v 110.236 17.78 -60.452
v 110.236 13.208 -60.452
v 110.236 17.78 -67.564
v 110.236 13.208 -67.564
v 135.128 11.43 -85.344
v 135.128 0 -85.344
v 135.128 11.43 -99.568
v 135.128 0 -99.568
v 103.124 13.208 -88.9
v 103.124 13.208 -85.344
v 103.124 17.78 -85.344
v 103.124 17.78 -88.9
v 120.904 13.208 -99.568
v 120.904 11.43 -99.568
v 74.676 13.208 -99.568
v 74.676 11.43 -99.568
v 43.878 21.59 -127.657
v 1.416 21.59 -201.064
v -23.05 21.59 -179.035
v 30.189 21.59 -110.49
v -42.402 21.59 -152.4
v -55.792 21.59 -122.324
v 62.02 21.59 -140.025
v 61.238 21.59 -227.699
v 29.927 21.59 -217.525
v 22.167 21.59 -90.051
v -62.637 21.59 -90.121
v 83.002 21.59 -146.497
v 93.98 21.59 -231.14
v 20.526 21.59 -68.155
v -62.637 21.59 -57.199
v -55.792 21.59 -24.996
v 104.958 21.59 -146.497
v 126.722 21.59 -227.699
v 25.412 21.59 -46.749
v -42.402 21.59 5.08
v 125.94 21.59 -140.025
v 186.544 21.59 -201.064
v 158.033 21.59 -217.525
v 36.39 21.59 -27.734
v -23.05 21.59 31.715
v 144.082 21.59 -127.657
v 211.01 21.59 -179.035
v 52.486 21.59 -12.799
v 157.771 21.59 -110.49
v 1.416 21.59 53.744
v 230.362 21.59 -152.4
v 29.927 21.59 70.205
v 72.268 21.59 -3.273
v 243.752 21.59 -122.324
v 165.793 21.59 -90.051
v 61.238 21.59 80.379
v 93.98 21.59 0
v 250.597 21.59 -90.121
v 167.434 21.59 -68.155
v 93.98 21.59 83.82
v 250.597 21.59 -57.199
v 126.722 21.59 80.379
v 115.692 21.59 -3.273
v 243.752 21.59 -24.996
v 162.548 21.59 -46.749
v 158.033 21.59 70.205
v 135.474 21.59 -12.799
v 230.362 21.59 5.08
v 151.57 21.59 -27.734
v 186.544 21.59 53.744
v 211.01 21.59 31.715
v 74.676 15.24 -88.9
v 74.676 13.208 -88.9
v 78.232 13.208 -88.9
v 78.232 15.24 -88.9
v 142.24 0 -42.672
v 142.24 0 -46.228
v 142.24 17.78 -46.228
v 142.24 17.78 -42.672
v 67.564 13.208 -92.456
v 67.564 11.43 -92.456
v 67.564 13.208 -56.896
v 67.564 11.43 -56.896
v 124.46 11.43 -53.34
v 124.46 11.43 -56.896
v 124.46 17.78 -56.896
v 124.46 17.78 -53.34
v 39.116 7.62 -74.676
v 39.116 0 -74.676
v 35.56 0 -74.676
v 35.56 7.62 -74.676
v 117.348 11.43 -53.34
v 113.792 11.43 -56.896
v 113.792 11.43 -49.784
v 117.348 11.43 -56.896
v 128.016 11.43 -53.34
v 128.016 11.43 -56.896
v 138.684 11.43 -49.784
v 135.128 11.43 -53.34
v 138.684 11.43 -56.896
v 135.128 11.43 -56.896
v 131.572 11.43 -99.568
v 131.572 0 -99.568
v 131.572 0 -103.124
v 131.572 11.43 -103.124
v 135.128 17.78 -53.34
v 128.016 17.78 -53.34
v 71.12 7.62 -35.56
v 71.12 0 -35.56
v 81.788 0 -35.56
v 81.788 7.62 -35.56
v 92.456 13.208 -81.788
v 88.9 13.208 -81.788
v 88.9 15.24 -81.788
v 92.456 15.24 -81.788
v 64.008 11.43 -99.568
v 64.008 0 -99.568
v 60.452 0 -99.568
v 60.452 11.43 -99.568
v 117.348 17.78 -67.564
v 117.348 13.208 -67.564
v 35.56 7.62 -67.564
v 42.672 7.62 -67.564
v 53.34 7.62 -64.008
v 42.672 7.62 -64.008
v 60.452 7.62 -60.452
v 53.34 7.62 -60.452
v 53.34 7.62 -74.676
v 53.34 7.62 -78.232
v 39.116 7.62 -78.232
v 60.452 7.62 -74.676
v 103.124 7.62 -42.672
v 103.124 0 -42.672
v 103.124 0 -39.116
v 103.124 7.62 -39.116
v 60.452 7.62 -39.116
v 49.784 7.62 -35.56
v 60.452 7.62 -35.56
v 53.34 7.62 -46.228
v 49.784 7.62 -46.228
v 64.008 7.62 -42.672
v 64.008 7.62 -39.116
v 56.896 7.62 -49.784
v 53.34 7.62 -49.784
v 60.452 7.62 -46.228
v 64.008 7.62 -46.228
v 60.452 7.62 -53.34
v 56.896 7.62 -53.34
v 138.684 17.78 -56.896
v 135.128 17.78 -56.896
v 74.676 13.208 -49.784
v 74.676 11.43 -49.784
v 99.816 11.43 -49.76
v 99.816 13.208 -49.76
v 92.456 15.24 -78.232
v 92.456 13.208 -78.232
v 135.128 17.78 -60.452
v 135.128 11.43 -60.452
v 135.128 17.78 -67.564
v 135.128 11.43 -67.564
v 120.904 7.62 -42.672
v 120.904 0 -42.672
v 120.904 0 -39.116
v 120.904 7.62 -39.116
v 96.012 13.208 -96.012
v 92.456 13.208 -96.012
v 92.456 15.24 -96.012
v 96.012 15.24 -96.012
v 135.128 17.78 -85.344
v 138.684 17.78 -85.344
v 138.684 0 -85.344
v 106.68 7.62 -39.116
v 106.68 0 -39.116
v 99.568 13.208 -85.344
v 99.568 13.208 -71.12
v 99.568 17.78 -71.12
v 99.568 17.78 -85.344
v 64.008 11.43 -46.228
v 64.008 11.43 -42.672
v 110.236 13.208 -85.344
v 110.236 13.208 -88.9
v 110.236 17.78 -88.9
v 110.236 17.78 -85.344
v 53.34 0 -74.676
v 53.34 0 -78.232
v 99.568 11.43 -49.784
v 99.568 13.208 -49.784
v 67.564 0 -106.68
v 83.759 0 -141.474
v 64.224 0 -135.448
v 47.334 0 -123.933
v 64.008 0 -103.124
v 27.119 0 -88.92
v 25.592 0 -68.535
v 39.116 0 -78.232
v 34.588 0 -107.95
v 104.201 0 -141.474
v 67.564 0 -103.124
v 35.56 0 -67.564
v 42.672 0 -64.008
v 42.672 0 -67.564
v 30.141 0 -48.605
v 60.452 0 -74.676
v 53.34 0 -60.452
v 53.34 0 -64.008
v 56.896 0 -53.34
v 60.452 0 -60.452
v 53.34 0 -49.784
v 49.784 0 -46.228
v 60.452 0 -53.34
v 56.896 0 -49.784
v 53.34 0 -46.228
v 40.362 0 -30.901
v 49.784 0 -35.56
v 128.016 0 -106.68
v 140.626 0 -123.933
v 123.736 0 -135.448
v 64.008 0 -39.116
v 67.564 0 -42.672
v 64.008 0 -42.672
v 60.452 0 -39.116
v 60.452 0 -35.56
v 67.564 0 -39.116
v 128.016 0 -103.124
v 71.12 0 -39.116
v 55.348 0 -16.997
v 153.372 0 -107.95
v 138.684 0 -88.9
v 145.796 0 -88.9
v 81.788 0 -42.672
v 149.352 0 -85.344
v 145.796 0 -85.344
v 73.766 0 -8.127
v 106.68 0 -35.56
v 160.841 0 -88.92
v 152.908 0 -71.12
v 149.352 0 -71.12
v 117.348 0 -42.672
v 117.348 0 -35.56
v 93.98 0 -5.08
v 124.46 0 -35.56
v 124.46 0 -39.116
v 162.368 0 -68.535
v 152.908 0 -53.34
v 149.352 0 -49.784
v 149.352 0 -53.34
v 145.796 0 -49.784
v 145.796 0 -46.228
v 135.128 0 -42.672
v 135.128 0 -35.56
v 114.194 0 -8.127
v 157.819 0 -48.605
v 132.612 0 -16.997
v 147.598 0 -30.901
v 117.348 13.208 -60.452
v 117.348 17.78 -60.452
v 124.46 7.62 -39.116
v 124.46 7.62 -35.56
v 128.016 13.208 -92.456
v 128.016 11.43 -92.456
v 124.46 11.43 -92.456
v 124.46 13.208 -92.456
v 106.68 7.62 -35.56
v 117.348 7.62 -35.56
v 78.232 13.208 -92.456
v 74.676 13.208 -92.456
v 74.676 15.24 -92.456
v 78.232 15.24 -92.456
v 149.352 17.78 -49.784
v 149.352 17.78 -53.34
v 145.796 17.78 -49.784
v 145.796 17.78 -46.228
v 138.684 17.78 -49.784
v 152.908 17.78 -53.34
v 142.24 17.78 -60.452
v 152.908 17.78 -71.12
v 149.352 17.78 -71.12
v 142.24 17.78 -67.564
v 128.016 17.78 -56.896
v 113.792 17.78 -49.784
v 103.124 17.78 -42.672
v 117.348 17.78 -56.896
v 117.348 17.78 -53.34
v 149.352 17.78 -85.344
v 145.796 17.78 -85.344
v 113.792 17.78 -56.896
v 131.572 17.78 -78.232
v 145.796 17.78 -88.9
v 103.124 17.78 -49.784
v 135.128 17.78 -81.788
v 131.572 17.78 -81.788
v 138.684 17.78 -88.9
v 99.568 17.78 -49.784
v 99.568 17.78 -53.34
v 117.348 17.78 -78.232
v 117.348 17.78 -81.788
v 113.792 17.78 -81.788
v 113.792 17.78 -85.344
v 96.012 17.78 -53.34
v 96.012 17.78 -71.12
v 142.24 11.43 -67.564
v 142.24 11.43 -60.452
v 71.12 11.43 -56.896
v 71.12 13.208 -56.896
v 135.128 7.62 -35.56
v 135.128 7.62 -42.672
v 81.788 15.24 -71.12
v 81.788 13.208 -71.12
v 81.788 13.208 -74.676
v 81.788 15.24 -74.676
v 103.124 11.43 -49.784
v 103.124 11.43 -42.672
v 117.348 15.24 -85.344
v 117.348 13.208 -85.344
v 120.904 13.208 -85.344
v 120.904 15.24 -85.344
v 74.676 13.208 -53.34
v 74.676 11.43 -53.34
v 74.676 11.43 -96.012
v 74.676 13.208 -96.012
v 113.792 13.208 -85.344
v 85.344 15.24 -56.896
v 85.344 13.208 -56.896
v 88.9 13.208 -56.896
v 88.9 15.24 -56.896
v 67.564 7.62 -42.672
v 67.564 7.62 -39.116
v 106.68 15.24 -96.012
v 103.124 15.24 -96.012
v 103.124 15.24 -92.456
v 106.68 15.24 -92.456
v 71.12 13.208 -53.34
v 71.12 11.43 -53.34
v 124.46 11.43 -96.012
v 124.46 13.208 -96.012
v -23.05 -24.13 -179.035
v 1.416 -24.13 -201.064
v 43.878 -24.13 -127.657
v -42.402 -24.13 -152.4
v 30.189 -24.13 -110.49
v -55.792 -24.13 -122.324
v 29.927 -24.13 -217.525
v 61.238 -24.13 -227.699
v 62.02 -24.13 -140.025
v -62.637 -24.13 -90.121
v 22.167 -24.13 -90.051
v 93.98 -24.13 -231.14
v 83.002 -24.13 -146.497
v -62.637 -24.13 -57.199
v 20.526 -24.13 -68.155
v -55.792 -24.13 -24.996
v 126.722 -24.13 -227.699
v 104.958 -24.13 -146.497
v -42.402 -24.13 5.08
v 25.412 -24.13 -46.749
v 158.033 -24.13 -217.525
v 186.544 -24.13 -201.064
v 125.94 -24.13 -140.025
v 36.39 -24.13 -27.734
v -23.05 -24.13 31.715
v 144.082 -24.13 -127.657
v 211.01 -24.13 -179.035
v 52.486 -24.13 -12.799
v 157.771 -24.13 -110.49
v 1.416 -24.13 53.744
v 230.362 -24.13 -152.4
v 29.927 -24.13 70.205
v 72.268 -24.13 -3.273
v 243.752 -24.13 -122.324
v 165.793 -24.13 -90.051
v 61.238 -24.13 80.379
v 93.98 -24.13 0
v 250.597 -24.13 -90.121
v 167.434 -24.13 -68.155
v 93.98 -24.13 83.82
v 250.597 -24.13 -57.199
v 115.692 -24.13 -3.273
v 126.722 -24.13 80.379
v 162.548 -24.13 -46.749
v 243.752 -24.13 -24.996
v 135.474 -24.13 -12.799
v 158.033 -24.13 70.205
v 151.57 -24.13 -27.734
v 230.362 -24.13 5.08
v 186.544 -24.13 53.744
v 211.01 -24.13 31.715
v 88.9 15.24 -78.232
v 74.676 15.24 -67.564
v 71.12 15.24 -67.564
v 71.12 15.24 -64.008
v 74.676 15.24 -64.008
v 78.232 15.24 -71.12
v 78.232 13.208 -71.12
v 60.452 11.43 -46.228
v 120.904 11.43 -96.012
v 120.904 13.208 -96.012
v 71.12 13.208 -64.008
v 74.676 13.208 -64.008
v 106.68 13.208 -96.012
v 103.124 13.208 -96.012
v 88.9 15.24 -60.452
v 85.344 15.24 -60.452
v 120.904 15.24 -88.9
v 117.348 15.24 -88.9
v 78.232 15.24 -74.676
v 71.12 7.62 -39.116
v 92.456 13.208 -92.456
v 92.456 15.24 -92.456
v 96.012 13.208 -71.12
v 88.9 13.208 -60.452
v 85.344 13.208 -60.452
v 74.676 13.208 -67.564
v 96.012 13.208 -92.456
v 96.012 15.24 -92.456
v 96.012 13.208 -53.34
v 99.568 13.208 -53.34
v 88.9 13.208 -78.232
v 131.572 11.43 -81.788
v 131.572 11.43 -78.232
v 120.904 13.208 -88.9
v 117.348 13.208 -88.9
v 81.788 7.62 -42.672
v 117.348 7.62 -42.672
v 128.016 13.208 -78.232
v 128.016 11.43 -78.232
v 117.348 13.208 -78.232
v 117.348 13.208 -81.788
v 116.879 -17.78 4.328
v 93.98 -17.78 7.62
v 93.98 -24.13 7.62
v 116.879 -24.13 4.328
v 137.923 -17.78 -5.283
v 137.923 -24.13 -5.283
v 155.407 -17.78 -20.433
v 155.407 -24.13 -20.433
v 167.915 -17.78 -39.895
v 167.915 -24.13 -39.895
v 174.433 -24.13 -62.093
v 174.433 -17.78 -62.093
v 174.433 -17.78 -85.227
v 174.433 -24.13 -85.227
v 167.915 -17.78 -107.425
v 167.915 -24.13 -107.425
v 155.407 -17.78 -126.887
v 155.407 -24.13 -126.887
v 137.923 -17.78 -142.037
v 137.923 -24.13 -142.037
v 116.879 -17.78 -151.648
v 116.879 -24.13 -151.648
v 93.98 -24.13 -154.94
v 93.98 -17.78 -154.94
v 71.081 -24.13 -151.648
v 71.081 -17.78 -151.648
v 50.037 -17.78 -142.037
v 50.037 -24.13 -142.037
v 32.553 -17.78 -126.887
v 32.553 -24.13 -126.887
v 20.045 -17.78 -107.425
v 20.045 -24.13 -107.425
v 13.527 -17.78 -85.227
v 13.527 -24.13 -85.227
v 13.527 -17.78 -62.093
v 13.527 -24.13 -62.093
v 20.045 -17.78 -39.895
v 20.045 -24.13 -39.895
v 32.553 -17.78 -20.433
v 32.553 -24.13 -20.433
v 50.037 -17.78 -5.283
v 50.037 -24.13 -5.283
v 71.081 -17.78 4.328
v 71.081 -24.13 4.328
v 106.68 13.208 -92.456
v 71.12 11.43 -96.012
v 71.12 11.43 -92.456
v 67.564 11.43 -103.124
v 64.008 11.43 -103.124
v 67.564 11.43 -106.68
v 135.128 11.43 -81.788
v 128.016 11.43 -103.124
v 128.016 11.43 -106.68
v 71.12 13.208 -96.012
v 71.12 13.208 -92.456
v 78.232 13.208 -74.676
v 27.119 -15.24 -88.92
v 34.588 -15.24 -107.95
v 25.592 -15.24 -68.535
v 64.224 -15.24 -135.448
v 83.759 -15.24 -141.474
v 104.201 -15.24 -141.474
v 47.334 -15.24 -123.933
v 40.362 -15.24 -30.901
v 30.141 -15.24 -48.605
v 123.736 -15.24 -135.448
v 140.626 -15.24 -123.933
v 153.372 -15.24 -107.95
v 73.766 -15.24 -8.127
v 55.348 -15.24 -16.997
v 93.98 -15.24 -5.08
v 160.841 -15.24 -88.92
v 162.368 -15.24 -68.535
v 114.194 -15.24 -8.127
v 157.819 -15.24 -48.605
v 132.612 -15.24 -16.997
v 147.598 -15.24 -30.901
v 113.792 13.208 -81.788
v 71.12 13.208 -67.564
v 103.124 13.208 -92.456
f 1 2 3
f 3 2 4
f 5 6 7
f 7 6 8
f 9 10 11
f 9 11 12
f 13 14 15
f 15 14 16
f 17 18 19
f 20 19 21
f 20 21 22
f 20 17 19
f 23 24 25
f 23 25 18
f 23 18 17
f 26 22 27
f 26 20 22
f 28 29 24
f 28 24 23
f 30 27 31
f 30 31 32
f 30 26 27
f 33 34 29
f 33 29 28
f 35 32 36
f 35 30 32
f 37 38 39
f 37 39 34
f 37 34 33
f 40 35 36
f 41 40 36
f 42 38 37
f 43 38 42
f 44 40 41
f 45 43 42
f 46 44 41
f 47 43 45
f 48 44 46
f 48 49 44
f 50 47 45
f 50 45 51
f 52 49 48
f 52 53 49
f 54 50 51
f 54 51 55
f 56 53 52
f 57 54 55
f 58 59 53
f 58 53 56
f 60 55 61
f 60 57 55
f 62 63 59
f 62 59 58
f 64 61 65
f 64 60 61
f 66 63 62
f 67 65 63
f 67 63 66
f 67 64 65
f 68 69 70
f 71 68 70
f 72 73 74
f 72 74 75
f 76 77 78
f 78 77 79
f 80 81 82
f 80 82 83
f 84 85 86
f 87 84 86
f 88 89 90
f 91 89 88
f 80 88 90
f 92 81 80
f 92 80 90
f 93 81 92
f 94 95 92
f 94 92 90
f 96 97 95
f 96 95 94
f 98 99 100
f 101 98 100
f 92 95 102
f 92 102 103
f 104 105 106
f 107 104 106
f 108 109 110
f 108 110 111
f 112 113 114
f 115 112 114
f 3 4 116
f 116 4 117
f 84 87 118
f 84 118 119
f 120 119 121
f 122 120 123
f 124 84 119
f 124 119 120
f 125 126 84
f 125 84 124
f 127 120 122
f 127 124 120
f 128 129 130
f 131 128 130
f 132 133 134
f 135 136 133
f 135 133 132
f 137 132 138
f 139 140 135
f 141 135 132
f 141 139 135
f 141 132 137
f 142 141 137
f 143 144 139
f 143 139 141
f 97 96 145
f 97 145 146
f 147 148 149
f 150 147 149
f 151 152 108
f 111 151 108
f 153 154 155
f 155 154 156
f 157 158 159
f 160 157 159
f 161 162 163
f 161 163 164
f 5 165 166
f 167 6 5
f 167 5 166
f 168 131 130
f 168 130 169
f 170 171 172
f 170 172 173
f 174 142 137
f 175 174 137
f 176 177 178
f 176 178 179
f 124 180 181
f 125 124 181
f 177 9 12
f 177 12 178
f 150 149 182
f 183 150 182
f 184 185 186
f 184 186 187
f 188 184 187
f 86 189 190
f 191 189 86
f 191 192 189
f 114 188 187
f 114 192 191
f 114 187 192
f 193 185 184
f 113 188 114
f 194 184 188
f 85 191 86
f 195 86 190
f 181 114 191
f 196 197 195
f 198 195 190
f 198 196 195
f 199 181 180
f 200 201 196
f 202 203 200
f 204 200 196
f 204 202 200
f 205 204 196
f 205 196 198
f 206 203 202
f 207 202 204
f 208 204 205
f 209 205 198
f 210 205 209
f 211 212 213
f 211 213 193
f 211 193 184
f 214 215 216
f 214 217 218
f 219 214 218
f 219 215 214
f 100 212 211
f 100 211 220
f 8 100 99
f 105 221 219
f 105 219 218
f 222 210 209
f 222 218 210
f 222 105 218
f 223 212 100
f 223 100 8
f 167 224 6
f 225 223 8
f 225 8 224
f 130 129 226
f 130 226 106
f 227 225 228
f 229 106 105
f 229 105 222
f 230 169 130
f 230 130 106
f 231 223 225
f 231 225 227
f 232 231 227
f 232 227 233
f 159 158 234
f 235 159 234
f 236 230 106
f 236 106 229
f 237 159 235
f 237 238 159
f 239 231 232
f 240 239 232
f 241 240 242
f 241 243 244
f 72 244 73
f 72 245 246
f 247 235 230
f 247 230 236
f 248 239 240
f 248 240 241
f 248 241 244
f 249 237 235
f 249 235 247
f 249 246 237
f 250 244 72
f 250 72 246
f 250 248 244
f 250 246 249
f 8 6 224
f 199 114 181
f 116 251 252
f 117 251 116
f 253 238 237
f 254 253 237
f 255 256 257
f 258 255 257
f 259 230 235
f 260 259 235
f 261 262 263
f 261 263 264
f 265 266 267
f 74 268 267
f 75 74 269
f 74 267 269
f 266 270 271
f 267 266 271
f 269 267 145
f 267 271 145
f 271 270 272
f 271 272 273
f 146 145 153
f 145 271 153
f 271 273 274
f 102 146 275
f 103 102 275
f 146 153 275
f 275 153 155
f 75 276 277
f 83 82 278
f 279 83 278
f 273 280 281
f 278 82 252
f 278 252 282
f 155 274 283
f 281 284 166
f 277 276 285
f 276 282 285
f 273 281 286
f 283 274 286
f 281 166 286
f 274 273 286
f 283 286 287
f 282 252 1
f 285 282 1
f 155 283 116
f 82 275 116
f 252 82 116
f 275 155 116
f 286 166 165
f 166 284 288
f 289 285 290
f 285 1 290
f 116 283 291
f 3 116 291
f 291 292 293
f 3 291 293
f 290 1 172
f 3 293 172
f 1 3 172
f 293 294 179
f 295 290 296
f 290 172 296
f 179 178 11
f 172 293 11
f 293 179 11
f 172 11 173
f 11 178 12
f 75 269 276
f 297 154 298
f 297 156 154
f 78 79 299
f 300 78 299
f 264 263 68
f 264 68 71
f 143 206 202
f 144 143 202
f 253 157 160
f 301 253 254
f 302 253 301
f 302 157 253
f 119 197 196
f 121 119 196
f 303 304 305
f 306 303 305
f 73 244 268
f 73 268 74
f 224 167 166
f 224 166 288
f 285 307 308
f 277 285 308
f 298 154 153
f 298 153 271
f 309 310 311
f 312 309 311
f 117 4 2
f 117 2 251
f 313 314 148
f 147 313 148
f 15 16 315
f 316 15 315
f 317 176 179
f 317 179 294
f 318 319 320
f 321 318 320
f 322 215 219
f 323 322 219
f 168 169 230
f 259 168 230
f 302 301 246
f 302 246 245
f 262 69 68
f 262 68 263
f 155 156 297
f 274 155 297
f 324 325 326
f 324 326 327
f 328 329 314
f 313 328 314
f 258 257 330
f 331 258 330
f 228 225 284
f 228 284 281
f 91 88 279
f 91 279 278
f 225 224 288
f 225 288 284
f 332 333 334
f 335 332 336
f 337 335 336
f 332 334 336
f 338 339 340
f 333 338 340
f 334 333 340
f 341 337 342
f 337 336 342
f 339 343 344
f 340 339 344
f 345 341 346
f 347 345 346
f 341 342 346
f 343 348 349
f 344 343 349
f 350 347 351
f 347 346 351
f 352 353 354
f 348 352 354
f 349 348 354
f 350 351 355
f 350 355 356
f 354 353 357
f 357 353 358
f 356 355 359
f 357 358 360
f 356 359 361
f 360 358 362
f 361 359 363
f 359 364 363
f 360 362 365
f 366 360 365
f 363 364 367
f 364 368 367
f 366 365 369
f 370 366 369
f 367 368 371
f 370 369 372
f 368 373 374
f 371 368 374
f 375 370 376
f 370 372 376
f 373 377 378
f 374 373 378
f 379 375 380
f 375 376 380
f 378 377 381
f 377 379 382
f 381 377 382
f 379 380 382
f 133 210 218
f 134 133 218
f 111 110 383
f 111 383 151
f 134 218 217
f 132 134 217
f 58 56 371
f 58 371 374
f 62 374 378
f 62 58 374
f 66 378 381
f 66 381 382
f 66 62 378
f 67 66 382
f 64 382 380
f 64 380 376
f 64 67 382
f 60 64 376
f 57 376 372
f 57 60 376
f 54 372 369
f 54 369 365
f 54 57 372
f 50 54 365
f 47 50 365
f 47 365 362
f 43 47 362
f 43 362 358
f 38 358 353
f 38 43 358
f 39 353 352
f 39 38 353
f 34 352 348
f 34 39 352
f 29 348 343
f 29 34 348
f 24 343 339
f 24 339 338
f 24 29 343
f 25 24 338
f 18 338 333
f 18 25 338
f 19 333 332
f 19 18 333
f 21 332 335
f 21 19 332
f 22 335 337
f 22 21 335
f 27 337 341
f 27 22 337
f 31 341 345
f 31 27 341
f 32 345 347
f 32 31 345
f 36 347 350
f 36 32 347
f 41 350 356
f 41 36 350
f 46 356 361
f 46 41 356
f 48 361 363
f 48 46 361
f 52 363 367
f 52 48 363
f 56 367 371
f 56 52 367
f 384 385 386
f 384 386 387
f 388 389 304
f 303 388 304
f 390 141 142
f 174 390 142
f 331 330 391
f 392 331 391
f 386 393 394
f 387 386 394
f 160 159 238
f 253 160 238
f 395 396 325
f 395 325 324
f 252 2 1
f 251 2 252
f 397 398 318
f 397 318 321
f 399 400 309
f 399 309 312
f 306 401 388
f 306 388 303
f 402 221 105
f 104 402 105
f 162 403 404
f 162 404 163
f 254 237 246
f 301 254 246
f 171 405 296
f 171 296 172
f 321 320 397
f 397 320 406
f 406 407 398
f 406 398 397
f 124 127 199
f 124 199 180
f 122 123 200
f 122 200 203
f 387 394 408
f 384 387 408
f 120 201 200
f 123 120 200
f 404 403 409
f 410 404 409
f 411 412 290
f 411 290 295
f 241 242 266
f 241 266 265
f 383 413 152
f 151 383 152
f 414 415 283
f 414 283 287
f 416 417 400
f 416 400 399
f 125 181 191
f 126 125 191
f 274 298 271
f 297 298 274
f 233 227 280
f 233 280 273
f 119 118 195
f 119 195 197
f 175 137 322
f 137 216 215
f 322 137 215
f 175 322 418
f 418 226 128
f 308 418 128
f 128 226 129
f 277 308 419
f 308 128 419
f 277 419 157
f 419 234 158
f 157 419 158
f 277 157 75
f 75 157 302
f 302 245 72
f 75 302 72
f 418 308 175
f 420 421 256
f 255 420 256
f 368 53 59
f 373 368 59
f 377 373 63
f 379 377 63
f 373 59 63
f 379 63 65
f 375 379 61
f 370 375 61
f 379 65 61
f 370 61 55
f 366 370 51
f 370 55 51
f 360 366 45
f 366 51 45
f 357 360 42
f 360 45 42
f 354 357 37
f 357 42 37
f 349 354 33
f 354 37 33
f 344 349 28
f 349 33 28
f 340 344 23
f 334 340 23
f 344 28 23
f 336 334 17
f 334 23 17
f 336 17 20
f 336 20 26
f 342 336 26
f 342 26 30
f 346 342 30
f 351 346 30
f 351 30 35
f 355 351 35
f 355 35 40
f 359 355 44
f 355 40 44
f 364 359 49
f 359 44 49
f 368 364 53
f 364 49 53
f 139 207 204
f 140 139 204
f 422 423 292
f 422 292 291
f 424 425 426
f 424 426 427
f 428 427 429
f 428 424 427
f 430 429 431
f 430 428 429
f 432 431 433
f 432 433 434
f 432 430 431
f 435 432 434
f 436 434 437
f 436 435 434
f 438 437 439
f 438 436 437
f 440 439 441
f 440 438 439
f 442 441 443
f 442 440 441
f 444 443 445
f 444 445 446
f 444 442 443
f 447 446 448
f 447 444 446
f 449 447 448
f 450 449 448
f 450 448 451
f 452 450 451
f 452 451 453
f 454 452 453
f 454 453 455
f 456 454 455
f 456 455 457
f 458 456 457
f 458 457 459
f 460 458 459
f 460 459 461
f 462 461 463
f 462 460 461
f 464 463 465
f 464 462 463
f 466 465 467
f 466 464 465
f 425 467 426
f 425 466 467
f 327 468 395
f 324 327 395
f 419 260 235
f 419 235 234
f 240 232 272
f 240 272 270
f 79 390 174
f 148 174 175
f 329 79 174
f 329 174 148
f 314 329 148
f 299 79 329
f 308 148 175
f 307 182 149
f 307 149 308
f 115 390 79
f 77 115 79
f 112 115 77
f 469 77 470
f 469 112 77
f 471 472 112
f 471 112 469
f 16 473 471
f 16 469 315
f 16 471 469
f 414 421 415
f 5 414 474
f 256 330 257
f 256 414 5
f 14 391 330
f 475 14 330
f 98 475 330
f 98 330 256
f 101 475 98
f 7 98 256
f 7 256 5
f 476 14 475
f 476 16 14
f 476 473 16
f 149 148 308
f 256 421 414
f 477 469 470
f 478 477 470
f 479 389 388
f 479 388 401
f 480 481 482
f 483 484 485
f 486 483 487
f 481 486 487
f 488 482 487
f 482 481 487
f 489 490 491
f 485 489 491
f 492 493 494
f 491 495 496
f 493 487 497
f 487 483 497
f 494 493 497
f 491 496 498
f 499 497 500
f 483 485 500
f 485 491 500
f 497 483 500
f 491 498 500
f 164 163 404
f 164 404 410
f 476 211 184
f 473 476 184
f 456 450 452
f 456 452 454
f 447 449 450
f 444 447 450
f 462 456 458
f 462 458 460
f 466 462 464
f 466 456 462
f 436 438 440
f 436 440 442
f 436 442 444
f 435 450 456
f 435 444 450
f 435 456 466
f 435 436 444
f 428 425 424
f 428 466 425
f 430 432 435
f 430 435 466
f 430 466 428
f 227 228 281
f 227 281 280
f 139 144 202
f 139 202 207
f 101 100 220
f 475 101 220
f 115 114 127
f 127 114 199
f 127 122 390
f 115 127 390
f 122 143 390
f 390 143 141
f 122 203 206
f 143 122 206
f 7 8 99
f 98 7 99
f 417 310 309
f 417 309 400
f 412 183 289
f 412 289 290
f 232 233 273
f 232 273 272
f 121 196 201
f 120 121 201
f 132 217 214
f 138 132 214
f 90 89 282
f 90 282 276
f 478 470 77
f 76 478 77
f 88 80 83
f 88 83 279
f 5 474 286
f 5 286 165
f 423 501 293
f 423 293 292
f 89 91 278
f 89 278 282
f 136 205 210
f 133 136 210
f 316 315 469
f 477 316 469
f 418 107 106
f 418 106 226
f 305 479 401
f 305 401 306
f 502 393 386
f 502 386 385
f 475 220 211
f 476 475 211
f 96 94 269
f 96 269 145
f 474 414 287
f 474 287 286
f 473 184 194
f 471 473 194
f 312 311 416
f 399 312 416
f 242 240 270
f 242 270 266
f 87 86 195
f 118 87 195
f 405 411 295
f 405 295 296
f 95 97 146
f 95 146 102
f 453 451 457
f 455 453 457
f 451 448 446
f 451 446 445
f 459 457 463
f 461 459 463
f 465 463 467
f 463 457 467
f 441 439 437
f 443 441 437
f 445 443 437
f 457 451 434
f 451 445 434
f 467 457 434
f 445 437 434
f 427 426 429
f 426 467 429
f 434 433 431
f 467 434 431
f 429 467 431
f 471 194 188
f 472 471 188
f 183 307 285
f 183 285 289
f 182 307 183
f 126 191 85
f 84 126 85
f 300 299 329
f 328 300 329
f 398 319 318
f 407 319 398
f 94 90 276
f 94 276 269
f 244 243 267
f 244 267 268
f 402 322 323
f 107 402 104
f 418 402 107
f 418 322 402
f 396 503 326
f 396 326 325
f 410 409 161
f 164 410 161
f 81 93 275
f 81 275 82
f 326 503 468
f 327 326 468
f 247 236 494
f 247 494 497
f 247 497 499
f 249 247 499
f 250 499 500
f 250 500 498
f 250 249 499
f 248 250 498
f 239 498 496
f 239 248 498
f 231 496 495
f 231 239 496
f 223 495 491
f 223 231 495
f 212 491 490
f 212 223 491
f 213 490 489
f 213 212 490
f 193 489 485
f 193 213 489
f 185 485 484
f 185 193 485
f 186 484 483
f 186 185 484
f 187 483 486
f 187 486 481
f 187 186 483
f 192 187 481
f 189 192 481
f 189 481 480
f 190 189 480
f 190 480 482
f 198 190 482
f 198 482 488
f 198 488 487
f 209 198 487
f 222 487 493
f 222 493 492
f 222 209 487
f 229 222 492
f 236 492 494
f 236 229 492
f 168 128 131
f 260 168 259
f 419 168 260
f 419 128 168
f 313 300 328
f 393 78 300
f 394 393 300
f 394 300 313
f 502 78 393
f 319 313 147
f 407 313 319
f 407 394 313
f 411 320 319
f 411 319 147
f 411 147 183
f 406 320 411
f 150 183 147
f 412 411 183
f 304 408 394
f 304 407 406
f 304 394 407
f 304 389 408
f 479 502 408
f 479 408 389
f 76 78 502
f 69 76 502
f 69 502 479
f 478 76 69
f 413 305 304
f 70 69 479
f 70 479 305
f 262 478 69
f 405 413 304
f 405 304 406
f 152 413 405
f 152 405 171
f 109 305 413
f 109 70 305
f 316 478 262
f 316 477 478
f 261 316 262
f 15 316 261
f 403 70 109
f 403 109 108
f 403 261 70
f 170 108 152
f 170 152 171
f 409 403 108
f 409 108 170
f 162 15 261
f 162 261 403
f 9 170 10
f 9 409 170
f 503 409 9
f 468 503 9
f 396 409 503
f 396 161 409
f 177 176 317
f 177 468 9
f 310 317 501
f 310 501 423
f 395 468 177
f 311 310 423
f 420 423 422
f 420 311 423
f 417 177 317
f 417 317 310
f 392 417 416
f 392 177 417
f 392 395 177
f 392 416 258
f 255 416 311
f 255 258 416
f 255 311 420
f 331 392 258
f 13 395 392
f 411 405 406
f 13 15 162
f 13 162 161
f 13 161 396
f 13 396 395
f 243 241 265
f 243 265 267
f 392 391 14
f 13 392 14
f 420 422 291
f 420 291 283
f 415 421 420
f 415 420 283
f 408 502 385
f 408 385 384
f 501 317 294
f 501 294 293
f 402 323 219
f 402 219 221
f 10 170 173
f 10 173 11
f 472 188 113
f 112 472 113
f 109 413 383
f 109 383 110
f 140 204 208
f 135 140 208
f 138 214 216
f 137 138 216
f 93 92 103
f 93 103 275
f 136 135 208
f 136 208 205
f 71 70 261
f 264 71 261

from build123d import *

# Parameters (mm, degrees)
FACE_3_W           = 7.112
FACE_3_H           = 7.112
FACE_2_DEPTH       = 17.78
FEETTAIL_DEPTH     = 7.62
POPTART_DEPTH      = 11.43
SPRINKLES_W        = 3.556
SPRINKLES_H        = 3.556
SPRINKLE_DEPTH     = 15.24
ENGRAVE_DEPTH      = 13.208
SKETCH2_R          = 68.58
CUPCAKE_DEPTH      = 15.24
RETAINING_START    = 21.59
SKETCH4_R          = 157.48
SKETCH4_R_2        = 73.66
RETAINING_DEPTH    = 45.72
CUPCAKE_START      = -17.78
SKETCH5_R          = 81.28
CUPCAKE_BODY_DEPTH = 6.35


with BuildPart() as part:
    # face 3 → face 2 (new body)
    with BuildSketch(Plane(origin=(0, 0, 0), x_dir=(1, 0, 0), z_dir=(0, 1, 0))):
        Polygon((103.124, 88.9), (110.236, 88.9), (110.236, 85.344), (113.792, 85.344), (113.792, 81.788), (117.348, 81.788), (117.348, 78.232), (131.572, 78.232), (131.572, 81.788), (135.128, 81.788), (135.128, 85.344), (138.684, 85.344), (138.684, 88.9), (145.796, 88.9), (145.796, 85.344), (149.352, 85.344), (149.352, 71.12), (152.908, 71.12), (152.908, 53.34), (149.352, 53.34), (149.352, 49.784), (145.796, 49.784), (145.796, 46.228), (142.24, 46.228), (142.24, 42.672), (103.124, 42.672), (103.124, 49.784), (99.568, 49.784), (99.568, 53.34), (96.012, 53.34), (96.012, 71.12), (99.568, 71.12), (99.568, 85.344), (103.124, 85.344), align=None)
        with Locations((113.792, 64.008)):
            Rectangle(FACE_3_W, FACE_3_H, mode=Mode.SUBTRACT)
        with Locations((138.684, 64.008)):
            Rectangle(FACE_3_W, FACE_3_H, mode=Mode.SUBTRACT)
        Polygon((113.792, 56.896), (113.792, 49.784), (138.684, 49.784), (138.684, 56.896), (135.128, 56.896), (135.128, 53.34), (128.016, 53.34), (128.016, 56.896), (124.46, 56.896), (124.46, 53.34), (117.348, 53.34), (117.348, 56.896), align=None, mode=Mode.SUBTRACT)
    extrude(amount=FACE_2_DEPTH)

    # feet tail → feettail (add)
    with BuildSketch(Plane(origin=(0, 0, 0), x_dir=(1, 0, 0), z_dir=(0, 1, 0))):
        Polygon((60.452, 74.676), (53.34, 74.676), (53.34, 78.232), (39.116, 78.232), (39.116, 74.676), (35.56, 74.676), (35.56, 67.564), (42.672, 67.564), (42.672, 64.008), (53.34, 64.008), (53.34, 60.452), (60.452, 60.452), align=None)
        Polygon((60.452, 53.34), (56.896, 53.34), (56.896, 49.784), (53.34, 49.784), (53.34, 46.228), (49.784, 46.228), (49.784, 35.56), (60.452, 35.56), (60.452, 39.116), (64.008, 39.116), (64.008, 46.228), (60.452, 46.228), align=None)
        Polygon((67.564, 42.672), (67.564, 39.116), (71.12, 39.116), (71.12, 35.56), (81.788, 35.56), (81.788, 42.672), align=None)
        Polygon((103.124, 42.672), (103.124, 39.116), (106.68, 39.116), (106.68, 35.56), (117.348, 35.56), (117.348, 42.672), align=None)
        Polygon((120.904, 42.672), (120.904, 39.116), (124.46, 39.116), (124.46, 35.56), (135.128, 35.56), (135.128, 42.672), align=None)
    extrude(amount=FEETTAIL_DEPTH)


with BuildPart() as feettail_piece_1:
    # of the separate pieces the step leaves, piece 1, a body of its own (feettail_pieces)
    add(part.part.solids().sort_by_distance((103.124, 0, -88.9))[0])



with BuildPart() as feettail_piece_2:
    # of the separate pieces the step leaves, piece 2, a body of its own (feettail_pieces)
    add(part.part.solids().sort_by_distance((60.452, 0, -74.676))[0])


with BuildPart() as feettail_piece_3:
    # of the separate pieces the step leaves, piece 3, a body of its own (feettail_pieces)
    add(part.part.solids().sort_by_distance((60.452, 0, -53.34))[0])


with BuildPart() as feettail_piece_4:
    # of the separate pieces the step leaves, piece 4, a body of its own (feettail_pieces)
    add(part.part.solids().sort_by_distance((67.564, 0, -42.672))[0])


with BuildPart() as feettail_piece_1_1:
    add(feettail_piece_1.part)

    add(feettail_piece_3.part)  # poptart merges feettail piece 3

    add(feettail_piece_4.part)  # poptart merges feettail piece 4
    # poptart 2 → poptart (add)
    with BuildSketch(Plane(origin=(0, 0, 0), x_dir=(1, 0, 0), z_dir=(0, 1, 0))):
        Polygon((135.128, 99.568), (131.572, 99.568), (131.572, 103.124), (128.016, 103.124), (128.016, 106.68), (67.564, 106.68), (67.564, 103.124), (64.008, 103.124), (64.008, 99.568), (60.452, 99.568), (60.452, 46.228), (64.008, 46.228), (64.008, 42.672), (135.128, 42.672), (145.796, 53.34), (145.796, 71.12), (135.128, 85.344), align=None)
    extrude(amount=POPTART_DEPTH)

    # sprinkles → sprinkle (add)
    with BuildSketch(Plane(origin=(0, 0, 0), x_dir=(1, 0, 0), z_dir=(0, 1, 0))):
        with Locations((72.898, 65.786)):
            Rectangle(SPRINKLES_W, SPRINKLES_H)
        with Locations((80.01, 72.898)):
            Rectangle(SPRINKLES_W, SPRINKLES_H)
        with Locations((90.678, 80.01)):
            Rectangle(SPRINKLES_W, SPRINKLES_H)
        with Locations((76.454, 90.678)):
            Rectangle(SPRINKLES_W, SPRINKLES_H)
        with Locations((94.234, 94.234)):
            Rectangle(SPRINKLES_W, SPRINKLES_H)
        with Locations((104.902, 94.234)):
            Rectangle(SPRINKLES_W, SPRINKLES_H)
        with Locations((119.126, 87.122)):
            Rectangle(SPRINKLES_W, SPRINKLES_H)
        with Locations((87.122, 58.674)):
            Rectangle(SPRINKLES_W, SPRINKLES_H)
    extrude(amount=SPRINKLE_DEPTH)

    # engrave poptart → engrave (add)
    with BuildSketch(Plane(origin=(0, 0, 0), x_dir=(1, 0, 0), z_dir=(0, 1, 0))):
        Polygon((71.12, 53.34), (74.676, 53.34), (74.676, 49.784), (99.816268886, 49.760009936), (99.568, 49.784), (128.016, 64.008), (128.016, 67.564), (128.016, 92.456), (124.46, 92.456), (124.46, 96.012), (120.904, 96.012), (120.904, 99.568), (74.676, 99.568), (74.676, 96.012), (71.12, 96.012), (71.12, 92.456), (67.564, 92.456), (67.564, 56.896), (71.12, 56.896), align=None)
    extrude(amount=ENGRAVE_DEPTH)


    add(feettail_piece_2.part)  # CUPCAKE merges feettail piece 2
    # Sketch2 → CUPCAKE (add)
    with BuildSketch(Plane(origin=(0, 0, 0), x_dir=(1, 0, 0), z_dir=(0, 1, 0))):
        with Locations(Location((93.98, 73.66, 0), (0, 0, 270))):
            Circle(SKETCH2_R)
    extrude(amount=-CUPCAKE_DEPTH)


with BuildPart() as body_2:
    # Sketch4 → retaining (new body)
    with BuildSketch(Plane(origin=(0, 0, 0), x_dir=(1, 0, 0), z_dir=(0, 1, 0)).offset(RETAINING_START)):
        with Locations(Location((93.98, 73.66, 0), (0, 0, 270))):
            Circle(SKETCH4_R)
        with Locations(Location((93.98, 73.66, 0), (0, 0, 270))):
            Circle(SKETCH4_R_2, mode=Mode.SUBTRACT)
    extrude(amount=-RETAINING_DEPTH)


with BuildPart() as body_3:
    # Sketch5 → cupcake body (new body)
    with BuildSketch(Plane(origin=(0, 0, 0), x_dir=(1, 0, 0), z_dir=(0, 1, 0)).offset(CUPCAKE_START)):
        with Locations(Location((93.98, 73.66, 0), (0, 0, 270))):
            Circle(SKETCH5_R)
    extrude(amount=-CUPCAKE_BODY_DEPTH)


solid = Compound([feettail_piece_1_1.part, body_2.part, body_3.part])
